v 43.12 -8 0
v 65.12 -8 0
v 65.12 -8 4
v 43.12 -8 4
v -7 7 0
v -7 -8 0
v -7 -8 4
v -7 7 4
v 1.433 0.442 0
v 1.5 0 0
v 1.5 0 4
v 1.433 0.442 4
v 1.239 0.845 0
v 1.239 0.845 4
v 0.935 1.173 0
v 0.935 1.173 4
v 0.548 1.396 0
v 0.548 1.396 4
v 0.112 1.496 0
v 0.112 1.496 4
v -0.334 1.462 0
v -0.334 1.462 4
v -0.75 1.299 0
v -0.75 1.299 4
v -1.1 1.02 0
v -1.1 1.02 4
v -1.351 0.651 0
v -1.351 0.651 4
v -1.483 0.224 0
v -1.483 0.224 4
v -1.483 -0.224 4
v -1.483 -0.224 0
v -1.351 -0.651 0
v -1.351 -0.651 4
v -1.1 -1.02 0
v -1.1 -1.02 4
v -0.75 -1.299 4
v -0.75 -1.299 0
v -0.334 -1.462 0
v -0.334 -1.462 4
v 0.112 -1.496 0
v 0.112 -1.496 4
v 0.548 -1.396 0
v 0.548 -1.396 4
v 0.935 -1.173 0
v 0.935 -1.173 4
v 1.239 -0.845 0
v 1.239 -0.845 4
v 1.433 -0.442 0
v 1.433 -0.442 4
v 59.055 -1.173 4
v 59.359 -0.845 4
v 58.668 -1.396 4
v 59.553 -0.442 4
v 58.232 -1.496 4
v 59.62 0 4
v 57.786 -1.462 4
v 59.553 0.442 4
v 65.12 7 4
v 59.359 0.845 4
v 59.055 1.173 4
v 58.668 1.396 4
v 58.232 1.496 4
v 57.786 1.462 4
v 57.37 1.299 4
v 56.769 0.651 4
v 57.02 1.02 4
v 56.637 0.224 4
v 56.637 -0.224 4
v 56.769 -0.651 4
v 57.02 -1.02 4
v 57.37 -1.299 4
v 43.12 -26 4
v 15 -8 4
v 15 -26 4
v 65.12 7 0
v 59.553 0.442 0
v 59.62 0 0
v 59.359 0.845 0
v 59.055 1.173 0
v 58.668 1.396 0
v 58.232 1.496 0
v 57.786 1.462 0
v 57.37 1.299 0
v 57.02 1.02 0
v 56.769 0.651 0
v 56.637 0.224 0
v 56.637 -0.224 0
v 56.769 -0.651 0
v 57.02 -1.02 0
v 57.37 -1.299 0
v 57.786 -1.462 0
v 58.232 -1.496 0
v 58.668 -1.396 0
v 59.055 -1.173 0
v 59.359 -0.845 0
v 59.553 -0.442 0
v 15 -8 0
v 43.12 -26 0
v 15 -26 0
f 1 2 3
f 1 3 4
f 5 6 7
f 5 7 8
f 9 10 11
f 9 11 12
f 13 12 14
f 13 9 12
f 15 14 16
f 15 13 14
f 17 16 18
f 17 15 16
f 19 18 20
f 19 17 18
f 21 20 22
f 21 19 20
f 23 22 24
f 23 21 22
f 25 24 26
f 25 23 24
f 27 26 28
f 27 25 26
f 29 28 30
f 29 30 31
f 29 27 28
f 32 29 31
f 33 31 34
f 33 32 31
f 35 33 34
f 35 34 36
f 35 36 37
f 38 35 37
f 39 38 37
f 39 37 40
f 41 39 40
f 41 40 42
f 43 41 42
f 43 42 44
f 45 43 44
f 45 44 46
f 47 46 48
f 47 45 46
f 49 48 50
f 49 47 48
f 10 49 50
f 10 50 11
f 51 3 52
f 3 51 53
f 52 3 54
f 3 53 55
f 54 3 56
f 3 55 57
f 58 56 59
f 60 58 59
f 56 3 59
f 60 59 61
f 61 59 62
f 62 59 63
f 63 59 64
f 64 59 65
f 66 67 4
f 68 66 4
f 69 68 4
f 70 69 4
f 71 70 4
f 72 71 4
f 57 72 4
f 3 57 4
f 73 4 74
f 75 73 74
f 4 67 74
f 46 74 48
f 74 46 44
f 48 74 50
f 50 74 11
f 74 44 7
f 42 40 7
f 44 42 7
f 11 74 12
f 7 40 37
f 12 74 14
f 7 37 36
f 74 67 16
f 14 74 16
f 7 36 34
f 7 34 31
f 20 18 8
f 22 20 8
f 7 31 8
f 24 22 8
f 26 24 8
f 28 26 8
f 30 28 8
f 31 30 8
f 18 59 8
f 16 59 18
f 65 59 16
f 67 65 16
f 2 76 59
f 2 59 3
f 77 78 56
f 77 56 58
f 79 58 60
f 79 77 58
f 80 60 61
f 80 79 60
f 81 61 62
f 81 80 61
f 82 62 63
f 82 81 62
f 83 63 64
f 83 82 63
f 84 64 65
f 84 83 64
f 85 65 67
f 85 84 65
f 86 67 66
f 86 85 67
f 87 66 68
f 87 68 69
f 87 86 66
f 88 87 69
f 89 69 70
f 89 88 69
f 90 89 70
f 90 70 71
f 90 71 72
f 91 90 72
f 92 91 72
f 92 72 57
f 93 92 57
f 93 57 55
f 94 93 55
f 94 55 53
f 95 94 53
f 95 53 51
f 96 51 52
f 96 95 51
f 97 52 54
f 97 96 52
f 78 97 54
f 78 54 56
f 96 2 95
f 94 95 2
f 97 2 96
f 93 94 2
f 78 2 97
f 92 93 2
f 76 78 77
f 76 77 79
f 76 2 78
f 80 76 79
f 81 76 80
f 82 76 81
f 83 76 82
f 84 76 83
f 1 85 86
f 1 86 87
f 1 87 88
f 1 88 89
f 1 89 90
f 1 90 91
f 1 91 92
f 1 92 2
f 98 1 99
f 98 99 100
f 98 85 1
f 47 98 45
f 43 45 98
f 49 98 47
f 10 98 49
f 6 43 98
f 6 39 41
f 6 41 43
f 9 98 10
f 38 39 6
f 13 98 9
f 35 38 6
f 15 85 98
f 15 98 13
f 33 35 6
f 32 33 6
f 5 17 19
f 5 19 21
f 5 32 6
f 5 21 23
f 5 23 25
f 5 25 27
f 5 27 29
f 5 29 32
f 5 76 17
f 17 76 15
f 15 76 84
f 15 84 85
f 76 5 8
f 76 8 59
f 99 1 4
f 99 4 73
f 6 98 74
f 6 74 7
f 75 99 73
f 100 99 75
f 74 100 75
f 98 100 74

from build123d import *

# Parameters (mm, degrees)
SKETCH_1_R      = 1.5
EXTRUDE_1_DEPTH = 4


with BuildPart() as part:
    # 草图1 → 凸台-拉伸1 (new body)
    with BuildSketch(Plane.XY):
        Polygon((-7, 7), (65.12, 7), (65.12, -8), (43.12, -8), (43.12, -26), (15, -26), (15, -8), (-7, -8), align=None)
        Circle(SKETCH_1_R, mode=Mode.SUBTRACT)
        with Locations((58.12, 0)):
            Circle(SKETCH_1_R, mode=Mode.SUBTRACT)
    extrude(amount=EXTRUDE_1_DEPTH)


solid = part.part
